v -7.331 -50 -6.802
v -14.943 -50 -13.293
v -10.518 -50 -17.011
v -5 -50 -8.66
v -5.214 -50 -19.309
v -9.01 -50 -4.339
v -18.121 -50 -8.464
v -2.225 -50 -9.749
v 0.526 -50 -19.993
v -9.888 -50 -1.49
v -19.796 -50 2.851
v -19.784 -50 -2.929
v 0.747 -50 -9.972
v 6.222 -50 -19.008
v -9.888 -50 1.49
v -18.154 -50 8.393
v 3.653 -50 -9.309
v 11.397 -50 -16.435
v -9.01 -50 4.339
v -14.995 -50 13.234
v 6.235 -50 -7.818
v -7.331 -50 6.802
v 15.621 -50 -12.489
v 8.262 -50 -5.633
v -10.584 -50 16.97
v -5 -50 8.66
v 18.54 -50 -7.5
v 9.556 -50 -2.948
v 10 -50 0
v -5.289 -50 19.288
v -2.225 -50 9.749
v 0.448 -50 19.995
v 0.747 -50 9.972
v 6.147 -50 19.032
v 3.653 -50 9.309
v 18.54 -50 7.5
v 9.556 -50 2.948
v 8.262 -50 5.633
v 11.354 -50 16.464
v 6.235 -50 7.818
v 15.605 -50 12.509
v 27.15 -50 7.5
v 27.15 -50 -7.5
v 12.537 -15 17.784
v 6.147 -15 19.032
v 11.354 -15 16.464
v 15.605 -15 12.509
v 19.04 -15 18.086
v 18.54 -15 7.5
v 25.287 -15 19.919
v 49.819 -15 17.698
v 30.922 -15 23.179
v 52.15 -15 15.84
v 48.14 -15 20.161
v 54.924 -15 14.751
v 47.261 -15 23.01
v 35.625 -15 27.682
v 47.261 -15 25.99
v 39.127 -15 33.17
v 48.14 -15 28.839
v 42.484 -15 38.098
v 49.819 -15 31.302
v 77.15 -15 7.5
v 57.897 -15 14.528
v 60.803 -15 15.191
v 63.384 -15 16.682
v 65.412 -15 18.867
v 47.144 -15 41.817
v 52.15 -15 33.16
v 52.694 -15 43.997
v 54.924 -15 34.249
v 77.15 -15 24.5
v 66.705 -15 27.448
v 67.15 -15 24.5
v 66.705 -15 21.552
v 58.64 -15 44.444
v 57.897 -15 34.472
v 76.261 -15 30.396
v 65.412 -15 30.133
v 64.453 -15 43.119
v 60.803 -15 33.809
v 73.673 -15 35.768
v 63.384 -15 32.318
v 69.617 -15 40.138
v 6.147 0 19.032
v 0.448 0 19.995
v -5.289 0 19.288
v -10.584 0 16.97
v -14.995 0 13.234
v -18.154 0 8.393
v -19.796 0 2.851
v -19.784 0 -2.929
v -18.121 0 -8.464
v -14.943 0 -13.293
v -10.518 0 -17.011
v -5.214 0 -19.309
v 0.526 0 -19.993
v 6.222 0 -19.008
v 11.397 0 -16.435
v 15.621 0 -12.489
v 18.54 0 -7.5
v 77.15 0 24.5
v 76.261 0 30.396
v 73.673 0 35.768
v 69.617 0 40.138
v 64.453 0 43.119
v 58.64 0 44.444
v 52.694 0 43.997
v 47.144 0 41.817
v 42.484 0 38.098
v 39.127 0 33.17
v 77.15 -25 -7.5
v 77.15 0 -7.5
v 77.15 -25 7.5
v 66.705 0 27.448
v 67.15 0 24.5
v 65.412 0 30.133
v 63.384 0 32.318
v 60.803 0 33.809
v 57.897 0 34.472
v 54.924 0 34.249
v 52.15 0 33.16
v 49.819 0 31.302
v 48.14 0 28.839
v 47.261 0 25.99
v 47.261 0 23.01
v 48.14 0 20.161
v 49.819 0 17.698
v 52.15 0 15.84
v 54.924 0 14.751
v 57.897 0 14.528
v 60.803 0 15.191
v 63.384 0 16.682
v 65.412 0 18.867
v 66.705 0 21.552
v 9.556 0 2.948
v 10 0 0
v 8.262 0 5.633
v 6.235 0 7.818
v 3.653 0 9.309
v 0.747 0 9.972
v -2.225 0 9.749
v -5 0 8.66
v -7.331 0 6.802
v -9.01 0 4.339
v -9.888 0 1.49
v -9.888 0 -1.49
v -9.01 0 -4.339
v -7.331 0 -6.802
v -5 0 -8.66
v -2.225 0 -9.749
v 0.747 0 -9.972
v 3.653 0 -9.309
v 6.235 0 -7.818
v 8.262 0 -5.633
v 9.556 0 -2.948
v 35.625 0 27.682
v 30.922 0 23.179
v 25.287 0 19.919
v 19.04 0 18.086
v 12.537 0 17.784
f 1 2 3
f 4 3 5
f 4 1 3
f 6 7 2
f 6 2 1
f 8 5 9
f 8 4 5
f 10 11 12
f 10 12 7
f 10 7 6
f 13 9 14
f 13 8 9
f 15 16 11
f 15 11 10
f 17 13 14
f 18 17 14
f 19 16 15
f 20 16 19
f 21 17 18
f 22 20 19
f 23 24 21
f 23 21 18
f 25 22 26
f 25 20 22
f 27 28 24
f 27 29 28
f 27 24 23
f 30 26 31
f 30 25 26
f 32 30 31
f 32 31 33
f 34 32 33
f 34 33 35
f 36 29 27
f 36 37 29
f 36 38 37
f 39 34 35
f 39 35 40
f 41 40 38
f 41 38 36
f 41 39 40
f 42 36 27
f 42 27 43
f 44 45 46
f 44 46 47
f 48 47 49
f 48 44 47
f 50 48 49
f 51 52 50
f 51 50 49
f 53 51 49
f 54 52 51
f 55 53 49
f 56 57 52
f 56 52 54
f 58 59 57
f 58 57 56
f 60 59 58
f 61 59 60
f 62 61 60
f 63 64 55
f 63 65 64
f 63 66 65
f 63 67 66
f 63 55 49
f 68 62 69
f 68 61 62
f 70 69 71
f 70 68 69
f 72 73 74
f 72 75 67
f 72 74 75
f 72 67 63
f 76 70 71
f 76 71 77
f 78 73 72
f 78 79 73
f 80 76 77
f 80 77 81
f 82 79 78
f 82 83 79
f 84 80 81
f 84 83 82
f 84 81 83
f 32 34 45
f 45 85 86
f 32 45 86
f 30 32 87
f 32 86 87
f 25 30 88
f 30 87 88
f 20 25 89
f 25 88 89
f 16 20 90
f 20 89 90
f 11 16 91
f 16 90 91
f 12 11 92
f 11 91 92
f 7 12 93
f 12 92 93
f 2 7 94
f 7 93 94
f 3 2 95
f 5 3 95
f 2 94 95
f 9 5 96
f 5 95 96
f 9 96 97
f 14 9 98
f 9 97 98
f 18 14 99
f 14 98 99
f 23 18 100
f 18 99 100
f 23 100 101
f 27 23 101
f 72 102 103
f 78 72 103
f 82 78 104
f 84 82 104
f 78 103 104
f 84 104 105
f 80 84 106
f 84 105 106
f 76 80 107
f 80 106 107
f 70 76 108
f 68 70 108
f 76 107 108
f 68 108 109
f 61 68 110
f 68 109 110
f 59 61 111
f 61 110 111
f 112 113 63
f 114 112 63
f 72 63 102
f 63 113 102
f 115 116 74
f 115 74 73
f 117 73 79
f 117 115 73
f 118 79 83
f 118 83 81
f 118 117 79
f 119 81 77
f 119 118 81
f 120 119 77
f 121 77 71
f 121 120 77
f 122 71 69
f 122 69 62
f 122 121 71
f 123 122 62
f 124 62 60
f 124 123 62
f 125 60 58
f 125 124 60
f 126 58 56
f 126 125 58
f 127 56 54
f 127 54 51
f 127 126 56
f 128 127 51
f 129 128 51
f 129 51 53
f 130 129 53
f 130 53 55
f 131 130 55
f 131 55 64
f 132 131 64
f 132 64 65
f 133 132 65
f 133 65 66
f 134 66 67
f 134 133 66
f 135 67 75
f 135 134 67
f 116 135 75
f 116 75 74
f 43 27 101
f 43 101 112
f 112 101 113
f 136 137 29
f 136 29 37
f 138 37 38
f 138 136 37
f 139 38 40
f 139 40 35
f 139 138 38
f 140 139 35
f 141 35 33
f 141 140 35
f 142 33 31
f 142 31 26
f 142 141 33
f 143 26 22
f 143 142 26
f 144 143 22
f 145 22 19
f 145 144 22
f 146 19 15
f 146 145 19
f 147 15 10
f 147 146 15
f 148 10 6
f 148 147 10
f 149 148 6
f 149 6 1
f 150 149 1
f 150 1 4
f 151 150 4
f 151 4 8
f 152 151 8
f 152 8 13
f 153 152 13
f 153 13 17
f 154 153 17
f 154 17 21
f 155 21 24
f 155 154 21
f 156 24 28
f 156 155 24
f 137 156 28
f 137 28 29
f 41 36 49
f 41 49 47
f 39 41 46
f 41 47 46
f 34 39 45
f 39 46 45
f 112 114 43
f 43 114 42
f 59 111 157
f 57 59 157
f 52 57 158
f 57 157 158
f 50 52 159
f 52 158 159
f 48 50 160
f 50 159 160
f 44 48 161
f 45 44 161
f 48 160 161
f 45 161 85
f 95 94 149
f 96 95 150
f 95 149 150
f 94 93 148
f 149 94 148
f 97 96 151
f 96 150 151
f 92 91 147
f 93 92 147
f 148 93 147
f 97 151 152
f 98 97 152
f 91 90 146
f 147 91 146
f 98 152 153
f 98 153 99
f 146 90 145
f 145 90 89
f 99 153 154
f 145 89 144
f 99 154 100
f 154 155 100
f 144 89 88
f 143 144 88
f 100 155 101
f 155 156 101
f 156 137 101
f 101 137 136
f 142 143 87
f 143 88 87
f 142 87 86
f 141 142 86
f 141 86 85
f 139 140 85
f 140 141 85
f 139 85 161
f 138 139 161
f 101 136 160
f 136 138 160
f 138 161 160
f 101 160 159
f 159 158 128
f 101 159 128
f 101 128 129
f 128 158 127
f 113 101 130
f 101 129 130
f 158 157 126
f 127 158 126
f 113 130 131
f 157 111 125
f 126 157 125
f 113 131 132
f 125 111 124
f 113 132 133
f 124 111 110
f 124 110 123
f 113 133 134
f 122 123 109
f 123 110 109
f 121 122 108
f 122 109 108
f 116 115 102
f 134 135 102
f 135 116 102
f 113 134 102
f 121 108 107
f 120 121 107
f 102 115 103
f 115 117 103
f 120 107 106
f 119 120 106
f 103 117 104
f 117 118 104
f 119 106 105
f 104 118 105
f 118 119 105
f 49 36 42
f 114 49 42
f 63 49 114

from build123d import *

# Parameters (mm, degrees)
F0_R     = 10
F1_DEPTH = 50
F0_W     = 50
F0_H     = 15
F2_DEPTH = 15
F3_W     = 50
F3_H     = 15
F4_DEPTH = 35
F6_DEPTH = 27.501
F8_DEPTH = 257.5


with BuildPart() as f1:
    # F0 (on Front) → F1 (new body)
    with BuildSketch(Plane.XZ):
        with BuildLine():
            ThreePointArc((18.540496, 7.5), (13.624005, 14.641943), (6.146908, 19.03196))
            ThreePointArc((6.146908, 19.03196), (-18.120519, -8.464442), (18.540496, -7.5))
            ThreePointArc((18.540496, -7.5), (19.631734, -3.820345), (20, 0))
            ThreePointArc((20, 0), (19.631734, 3.820345), (18.540496, 7.5))
        make_face()
        Circle(F0_R, mode=Mode.SUBTRACT)
        with BuildLine():
            Line((27.149505, -7.5), (27.149505, 7.5))
            Line((27.149505, 7.5), (18.540496, 7.5))
            ThreePointArc((18.540496, 7.5), (19.631734, 3.820345), (20, 0))
            ThreePointArc((20, 0), (19.631734, -3.820345), (18.540496, -7.5))
            Line((18.540496, -7.5), (27.149505, -7.5))
        make_face()
    extrude(amount=F1_DEPTH)

    # F0 (on Front) → F2 (join)
    with BuildSketch(Plane.XZ):
        with BuildLine():
            Line((77.149505, 7.5), (77.149505, 24.5))
            ThreePointArc((77.149505, 24.5), (61.595967, 43.999461), (39.126608, 33.170362))
            ThreePointArc((39.126608, 33.170362), (25.287149, 19.918772), (6.146908, 19.03196))
            ThreePointArc((6.146908, 19.03196), (13.624005, 14.641943), (18.540496, 7.5))
            Line((18.540496, 7.5), (27.149505, 7.5))
            Line((27.149505, 7.5), (77.149505, 7.5))
        make_face()
        with Locations((57.149505, 24.5)):
            Circle(F0_R, mode=Mode.SUBTRACT)
        with Locations((52.149505, 0)):
            Rectangle(F0_W, F0_H)
    extrude(amount=F2_DEPTH)

    # F3 (on face) → F4 (join)
    with BuildSketch(Plane.XZ.offset(15)):
        with Locations((52.149505, 0)):
            Rectangle(F3_W, F3_H)
    extrude(amount=F4_DEPTH)

    # F5 (on face) → F6 (join, through all)
    with BuildSketch(Plane.XY.offset(7.5)):
        Polygon((77.149505, -25), (27.149505, -50), (77.149505, -50), align=None)
    extrude(amount=-F6_DEPTH)

    # F7 (on face) → F8 (cut)
    with BuildSketch(Plane.XY.offset(7.5)):
        Polygon((77.149505, -25), (27.149505, -50), (77.149505, -50), align=None)
    extrude(amount=-F8_DEPTH, mode=Mode.SUBTRACT)


solid = f1.part
